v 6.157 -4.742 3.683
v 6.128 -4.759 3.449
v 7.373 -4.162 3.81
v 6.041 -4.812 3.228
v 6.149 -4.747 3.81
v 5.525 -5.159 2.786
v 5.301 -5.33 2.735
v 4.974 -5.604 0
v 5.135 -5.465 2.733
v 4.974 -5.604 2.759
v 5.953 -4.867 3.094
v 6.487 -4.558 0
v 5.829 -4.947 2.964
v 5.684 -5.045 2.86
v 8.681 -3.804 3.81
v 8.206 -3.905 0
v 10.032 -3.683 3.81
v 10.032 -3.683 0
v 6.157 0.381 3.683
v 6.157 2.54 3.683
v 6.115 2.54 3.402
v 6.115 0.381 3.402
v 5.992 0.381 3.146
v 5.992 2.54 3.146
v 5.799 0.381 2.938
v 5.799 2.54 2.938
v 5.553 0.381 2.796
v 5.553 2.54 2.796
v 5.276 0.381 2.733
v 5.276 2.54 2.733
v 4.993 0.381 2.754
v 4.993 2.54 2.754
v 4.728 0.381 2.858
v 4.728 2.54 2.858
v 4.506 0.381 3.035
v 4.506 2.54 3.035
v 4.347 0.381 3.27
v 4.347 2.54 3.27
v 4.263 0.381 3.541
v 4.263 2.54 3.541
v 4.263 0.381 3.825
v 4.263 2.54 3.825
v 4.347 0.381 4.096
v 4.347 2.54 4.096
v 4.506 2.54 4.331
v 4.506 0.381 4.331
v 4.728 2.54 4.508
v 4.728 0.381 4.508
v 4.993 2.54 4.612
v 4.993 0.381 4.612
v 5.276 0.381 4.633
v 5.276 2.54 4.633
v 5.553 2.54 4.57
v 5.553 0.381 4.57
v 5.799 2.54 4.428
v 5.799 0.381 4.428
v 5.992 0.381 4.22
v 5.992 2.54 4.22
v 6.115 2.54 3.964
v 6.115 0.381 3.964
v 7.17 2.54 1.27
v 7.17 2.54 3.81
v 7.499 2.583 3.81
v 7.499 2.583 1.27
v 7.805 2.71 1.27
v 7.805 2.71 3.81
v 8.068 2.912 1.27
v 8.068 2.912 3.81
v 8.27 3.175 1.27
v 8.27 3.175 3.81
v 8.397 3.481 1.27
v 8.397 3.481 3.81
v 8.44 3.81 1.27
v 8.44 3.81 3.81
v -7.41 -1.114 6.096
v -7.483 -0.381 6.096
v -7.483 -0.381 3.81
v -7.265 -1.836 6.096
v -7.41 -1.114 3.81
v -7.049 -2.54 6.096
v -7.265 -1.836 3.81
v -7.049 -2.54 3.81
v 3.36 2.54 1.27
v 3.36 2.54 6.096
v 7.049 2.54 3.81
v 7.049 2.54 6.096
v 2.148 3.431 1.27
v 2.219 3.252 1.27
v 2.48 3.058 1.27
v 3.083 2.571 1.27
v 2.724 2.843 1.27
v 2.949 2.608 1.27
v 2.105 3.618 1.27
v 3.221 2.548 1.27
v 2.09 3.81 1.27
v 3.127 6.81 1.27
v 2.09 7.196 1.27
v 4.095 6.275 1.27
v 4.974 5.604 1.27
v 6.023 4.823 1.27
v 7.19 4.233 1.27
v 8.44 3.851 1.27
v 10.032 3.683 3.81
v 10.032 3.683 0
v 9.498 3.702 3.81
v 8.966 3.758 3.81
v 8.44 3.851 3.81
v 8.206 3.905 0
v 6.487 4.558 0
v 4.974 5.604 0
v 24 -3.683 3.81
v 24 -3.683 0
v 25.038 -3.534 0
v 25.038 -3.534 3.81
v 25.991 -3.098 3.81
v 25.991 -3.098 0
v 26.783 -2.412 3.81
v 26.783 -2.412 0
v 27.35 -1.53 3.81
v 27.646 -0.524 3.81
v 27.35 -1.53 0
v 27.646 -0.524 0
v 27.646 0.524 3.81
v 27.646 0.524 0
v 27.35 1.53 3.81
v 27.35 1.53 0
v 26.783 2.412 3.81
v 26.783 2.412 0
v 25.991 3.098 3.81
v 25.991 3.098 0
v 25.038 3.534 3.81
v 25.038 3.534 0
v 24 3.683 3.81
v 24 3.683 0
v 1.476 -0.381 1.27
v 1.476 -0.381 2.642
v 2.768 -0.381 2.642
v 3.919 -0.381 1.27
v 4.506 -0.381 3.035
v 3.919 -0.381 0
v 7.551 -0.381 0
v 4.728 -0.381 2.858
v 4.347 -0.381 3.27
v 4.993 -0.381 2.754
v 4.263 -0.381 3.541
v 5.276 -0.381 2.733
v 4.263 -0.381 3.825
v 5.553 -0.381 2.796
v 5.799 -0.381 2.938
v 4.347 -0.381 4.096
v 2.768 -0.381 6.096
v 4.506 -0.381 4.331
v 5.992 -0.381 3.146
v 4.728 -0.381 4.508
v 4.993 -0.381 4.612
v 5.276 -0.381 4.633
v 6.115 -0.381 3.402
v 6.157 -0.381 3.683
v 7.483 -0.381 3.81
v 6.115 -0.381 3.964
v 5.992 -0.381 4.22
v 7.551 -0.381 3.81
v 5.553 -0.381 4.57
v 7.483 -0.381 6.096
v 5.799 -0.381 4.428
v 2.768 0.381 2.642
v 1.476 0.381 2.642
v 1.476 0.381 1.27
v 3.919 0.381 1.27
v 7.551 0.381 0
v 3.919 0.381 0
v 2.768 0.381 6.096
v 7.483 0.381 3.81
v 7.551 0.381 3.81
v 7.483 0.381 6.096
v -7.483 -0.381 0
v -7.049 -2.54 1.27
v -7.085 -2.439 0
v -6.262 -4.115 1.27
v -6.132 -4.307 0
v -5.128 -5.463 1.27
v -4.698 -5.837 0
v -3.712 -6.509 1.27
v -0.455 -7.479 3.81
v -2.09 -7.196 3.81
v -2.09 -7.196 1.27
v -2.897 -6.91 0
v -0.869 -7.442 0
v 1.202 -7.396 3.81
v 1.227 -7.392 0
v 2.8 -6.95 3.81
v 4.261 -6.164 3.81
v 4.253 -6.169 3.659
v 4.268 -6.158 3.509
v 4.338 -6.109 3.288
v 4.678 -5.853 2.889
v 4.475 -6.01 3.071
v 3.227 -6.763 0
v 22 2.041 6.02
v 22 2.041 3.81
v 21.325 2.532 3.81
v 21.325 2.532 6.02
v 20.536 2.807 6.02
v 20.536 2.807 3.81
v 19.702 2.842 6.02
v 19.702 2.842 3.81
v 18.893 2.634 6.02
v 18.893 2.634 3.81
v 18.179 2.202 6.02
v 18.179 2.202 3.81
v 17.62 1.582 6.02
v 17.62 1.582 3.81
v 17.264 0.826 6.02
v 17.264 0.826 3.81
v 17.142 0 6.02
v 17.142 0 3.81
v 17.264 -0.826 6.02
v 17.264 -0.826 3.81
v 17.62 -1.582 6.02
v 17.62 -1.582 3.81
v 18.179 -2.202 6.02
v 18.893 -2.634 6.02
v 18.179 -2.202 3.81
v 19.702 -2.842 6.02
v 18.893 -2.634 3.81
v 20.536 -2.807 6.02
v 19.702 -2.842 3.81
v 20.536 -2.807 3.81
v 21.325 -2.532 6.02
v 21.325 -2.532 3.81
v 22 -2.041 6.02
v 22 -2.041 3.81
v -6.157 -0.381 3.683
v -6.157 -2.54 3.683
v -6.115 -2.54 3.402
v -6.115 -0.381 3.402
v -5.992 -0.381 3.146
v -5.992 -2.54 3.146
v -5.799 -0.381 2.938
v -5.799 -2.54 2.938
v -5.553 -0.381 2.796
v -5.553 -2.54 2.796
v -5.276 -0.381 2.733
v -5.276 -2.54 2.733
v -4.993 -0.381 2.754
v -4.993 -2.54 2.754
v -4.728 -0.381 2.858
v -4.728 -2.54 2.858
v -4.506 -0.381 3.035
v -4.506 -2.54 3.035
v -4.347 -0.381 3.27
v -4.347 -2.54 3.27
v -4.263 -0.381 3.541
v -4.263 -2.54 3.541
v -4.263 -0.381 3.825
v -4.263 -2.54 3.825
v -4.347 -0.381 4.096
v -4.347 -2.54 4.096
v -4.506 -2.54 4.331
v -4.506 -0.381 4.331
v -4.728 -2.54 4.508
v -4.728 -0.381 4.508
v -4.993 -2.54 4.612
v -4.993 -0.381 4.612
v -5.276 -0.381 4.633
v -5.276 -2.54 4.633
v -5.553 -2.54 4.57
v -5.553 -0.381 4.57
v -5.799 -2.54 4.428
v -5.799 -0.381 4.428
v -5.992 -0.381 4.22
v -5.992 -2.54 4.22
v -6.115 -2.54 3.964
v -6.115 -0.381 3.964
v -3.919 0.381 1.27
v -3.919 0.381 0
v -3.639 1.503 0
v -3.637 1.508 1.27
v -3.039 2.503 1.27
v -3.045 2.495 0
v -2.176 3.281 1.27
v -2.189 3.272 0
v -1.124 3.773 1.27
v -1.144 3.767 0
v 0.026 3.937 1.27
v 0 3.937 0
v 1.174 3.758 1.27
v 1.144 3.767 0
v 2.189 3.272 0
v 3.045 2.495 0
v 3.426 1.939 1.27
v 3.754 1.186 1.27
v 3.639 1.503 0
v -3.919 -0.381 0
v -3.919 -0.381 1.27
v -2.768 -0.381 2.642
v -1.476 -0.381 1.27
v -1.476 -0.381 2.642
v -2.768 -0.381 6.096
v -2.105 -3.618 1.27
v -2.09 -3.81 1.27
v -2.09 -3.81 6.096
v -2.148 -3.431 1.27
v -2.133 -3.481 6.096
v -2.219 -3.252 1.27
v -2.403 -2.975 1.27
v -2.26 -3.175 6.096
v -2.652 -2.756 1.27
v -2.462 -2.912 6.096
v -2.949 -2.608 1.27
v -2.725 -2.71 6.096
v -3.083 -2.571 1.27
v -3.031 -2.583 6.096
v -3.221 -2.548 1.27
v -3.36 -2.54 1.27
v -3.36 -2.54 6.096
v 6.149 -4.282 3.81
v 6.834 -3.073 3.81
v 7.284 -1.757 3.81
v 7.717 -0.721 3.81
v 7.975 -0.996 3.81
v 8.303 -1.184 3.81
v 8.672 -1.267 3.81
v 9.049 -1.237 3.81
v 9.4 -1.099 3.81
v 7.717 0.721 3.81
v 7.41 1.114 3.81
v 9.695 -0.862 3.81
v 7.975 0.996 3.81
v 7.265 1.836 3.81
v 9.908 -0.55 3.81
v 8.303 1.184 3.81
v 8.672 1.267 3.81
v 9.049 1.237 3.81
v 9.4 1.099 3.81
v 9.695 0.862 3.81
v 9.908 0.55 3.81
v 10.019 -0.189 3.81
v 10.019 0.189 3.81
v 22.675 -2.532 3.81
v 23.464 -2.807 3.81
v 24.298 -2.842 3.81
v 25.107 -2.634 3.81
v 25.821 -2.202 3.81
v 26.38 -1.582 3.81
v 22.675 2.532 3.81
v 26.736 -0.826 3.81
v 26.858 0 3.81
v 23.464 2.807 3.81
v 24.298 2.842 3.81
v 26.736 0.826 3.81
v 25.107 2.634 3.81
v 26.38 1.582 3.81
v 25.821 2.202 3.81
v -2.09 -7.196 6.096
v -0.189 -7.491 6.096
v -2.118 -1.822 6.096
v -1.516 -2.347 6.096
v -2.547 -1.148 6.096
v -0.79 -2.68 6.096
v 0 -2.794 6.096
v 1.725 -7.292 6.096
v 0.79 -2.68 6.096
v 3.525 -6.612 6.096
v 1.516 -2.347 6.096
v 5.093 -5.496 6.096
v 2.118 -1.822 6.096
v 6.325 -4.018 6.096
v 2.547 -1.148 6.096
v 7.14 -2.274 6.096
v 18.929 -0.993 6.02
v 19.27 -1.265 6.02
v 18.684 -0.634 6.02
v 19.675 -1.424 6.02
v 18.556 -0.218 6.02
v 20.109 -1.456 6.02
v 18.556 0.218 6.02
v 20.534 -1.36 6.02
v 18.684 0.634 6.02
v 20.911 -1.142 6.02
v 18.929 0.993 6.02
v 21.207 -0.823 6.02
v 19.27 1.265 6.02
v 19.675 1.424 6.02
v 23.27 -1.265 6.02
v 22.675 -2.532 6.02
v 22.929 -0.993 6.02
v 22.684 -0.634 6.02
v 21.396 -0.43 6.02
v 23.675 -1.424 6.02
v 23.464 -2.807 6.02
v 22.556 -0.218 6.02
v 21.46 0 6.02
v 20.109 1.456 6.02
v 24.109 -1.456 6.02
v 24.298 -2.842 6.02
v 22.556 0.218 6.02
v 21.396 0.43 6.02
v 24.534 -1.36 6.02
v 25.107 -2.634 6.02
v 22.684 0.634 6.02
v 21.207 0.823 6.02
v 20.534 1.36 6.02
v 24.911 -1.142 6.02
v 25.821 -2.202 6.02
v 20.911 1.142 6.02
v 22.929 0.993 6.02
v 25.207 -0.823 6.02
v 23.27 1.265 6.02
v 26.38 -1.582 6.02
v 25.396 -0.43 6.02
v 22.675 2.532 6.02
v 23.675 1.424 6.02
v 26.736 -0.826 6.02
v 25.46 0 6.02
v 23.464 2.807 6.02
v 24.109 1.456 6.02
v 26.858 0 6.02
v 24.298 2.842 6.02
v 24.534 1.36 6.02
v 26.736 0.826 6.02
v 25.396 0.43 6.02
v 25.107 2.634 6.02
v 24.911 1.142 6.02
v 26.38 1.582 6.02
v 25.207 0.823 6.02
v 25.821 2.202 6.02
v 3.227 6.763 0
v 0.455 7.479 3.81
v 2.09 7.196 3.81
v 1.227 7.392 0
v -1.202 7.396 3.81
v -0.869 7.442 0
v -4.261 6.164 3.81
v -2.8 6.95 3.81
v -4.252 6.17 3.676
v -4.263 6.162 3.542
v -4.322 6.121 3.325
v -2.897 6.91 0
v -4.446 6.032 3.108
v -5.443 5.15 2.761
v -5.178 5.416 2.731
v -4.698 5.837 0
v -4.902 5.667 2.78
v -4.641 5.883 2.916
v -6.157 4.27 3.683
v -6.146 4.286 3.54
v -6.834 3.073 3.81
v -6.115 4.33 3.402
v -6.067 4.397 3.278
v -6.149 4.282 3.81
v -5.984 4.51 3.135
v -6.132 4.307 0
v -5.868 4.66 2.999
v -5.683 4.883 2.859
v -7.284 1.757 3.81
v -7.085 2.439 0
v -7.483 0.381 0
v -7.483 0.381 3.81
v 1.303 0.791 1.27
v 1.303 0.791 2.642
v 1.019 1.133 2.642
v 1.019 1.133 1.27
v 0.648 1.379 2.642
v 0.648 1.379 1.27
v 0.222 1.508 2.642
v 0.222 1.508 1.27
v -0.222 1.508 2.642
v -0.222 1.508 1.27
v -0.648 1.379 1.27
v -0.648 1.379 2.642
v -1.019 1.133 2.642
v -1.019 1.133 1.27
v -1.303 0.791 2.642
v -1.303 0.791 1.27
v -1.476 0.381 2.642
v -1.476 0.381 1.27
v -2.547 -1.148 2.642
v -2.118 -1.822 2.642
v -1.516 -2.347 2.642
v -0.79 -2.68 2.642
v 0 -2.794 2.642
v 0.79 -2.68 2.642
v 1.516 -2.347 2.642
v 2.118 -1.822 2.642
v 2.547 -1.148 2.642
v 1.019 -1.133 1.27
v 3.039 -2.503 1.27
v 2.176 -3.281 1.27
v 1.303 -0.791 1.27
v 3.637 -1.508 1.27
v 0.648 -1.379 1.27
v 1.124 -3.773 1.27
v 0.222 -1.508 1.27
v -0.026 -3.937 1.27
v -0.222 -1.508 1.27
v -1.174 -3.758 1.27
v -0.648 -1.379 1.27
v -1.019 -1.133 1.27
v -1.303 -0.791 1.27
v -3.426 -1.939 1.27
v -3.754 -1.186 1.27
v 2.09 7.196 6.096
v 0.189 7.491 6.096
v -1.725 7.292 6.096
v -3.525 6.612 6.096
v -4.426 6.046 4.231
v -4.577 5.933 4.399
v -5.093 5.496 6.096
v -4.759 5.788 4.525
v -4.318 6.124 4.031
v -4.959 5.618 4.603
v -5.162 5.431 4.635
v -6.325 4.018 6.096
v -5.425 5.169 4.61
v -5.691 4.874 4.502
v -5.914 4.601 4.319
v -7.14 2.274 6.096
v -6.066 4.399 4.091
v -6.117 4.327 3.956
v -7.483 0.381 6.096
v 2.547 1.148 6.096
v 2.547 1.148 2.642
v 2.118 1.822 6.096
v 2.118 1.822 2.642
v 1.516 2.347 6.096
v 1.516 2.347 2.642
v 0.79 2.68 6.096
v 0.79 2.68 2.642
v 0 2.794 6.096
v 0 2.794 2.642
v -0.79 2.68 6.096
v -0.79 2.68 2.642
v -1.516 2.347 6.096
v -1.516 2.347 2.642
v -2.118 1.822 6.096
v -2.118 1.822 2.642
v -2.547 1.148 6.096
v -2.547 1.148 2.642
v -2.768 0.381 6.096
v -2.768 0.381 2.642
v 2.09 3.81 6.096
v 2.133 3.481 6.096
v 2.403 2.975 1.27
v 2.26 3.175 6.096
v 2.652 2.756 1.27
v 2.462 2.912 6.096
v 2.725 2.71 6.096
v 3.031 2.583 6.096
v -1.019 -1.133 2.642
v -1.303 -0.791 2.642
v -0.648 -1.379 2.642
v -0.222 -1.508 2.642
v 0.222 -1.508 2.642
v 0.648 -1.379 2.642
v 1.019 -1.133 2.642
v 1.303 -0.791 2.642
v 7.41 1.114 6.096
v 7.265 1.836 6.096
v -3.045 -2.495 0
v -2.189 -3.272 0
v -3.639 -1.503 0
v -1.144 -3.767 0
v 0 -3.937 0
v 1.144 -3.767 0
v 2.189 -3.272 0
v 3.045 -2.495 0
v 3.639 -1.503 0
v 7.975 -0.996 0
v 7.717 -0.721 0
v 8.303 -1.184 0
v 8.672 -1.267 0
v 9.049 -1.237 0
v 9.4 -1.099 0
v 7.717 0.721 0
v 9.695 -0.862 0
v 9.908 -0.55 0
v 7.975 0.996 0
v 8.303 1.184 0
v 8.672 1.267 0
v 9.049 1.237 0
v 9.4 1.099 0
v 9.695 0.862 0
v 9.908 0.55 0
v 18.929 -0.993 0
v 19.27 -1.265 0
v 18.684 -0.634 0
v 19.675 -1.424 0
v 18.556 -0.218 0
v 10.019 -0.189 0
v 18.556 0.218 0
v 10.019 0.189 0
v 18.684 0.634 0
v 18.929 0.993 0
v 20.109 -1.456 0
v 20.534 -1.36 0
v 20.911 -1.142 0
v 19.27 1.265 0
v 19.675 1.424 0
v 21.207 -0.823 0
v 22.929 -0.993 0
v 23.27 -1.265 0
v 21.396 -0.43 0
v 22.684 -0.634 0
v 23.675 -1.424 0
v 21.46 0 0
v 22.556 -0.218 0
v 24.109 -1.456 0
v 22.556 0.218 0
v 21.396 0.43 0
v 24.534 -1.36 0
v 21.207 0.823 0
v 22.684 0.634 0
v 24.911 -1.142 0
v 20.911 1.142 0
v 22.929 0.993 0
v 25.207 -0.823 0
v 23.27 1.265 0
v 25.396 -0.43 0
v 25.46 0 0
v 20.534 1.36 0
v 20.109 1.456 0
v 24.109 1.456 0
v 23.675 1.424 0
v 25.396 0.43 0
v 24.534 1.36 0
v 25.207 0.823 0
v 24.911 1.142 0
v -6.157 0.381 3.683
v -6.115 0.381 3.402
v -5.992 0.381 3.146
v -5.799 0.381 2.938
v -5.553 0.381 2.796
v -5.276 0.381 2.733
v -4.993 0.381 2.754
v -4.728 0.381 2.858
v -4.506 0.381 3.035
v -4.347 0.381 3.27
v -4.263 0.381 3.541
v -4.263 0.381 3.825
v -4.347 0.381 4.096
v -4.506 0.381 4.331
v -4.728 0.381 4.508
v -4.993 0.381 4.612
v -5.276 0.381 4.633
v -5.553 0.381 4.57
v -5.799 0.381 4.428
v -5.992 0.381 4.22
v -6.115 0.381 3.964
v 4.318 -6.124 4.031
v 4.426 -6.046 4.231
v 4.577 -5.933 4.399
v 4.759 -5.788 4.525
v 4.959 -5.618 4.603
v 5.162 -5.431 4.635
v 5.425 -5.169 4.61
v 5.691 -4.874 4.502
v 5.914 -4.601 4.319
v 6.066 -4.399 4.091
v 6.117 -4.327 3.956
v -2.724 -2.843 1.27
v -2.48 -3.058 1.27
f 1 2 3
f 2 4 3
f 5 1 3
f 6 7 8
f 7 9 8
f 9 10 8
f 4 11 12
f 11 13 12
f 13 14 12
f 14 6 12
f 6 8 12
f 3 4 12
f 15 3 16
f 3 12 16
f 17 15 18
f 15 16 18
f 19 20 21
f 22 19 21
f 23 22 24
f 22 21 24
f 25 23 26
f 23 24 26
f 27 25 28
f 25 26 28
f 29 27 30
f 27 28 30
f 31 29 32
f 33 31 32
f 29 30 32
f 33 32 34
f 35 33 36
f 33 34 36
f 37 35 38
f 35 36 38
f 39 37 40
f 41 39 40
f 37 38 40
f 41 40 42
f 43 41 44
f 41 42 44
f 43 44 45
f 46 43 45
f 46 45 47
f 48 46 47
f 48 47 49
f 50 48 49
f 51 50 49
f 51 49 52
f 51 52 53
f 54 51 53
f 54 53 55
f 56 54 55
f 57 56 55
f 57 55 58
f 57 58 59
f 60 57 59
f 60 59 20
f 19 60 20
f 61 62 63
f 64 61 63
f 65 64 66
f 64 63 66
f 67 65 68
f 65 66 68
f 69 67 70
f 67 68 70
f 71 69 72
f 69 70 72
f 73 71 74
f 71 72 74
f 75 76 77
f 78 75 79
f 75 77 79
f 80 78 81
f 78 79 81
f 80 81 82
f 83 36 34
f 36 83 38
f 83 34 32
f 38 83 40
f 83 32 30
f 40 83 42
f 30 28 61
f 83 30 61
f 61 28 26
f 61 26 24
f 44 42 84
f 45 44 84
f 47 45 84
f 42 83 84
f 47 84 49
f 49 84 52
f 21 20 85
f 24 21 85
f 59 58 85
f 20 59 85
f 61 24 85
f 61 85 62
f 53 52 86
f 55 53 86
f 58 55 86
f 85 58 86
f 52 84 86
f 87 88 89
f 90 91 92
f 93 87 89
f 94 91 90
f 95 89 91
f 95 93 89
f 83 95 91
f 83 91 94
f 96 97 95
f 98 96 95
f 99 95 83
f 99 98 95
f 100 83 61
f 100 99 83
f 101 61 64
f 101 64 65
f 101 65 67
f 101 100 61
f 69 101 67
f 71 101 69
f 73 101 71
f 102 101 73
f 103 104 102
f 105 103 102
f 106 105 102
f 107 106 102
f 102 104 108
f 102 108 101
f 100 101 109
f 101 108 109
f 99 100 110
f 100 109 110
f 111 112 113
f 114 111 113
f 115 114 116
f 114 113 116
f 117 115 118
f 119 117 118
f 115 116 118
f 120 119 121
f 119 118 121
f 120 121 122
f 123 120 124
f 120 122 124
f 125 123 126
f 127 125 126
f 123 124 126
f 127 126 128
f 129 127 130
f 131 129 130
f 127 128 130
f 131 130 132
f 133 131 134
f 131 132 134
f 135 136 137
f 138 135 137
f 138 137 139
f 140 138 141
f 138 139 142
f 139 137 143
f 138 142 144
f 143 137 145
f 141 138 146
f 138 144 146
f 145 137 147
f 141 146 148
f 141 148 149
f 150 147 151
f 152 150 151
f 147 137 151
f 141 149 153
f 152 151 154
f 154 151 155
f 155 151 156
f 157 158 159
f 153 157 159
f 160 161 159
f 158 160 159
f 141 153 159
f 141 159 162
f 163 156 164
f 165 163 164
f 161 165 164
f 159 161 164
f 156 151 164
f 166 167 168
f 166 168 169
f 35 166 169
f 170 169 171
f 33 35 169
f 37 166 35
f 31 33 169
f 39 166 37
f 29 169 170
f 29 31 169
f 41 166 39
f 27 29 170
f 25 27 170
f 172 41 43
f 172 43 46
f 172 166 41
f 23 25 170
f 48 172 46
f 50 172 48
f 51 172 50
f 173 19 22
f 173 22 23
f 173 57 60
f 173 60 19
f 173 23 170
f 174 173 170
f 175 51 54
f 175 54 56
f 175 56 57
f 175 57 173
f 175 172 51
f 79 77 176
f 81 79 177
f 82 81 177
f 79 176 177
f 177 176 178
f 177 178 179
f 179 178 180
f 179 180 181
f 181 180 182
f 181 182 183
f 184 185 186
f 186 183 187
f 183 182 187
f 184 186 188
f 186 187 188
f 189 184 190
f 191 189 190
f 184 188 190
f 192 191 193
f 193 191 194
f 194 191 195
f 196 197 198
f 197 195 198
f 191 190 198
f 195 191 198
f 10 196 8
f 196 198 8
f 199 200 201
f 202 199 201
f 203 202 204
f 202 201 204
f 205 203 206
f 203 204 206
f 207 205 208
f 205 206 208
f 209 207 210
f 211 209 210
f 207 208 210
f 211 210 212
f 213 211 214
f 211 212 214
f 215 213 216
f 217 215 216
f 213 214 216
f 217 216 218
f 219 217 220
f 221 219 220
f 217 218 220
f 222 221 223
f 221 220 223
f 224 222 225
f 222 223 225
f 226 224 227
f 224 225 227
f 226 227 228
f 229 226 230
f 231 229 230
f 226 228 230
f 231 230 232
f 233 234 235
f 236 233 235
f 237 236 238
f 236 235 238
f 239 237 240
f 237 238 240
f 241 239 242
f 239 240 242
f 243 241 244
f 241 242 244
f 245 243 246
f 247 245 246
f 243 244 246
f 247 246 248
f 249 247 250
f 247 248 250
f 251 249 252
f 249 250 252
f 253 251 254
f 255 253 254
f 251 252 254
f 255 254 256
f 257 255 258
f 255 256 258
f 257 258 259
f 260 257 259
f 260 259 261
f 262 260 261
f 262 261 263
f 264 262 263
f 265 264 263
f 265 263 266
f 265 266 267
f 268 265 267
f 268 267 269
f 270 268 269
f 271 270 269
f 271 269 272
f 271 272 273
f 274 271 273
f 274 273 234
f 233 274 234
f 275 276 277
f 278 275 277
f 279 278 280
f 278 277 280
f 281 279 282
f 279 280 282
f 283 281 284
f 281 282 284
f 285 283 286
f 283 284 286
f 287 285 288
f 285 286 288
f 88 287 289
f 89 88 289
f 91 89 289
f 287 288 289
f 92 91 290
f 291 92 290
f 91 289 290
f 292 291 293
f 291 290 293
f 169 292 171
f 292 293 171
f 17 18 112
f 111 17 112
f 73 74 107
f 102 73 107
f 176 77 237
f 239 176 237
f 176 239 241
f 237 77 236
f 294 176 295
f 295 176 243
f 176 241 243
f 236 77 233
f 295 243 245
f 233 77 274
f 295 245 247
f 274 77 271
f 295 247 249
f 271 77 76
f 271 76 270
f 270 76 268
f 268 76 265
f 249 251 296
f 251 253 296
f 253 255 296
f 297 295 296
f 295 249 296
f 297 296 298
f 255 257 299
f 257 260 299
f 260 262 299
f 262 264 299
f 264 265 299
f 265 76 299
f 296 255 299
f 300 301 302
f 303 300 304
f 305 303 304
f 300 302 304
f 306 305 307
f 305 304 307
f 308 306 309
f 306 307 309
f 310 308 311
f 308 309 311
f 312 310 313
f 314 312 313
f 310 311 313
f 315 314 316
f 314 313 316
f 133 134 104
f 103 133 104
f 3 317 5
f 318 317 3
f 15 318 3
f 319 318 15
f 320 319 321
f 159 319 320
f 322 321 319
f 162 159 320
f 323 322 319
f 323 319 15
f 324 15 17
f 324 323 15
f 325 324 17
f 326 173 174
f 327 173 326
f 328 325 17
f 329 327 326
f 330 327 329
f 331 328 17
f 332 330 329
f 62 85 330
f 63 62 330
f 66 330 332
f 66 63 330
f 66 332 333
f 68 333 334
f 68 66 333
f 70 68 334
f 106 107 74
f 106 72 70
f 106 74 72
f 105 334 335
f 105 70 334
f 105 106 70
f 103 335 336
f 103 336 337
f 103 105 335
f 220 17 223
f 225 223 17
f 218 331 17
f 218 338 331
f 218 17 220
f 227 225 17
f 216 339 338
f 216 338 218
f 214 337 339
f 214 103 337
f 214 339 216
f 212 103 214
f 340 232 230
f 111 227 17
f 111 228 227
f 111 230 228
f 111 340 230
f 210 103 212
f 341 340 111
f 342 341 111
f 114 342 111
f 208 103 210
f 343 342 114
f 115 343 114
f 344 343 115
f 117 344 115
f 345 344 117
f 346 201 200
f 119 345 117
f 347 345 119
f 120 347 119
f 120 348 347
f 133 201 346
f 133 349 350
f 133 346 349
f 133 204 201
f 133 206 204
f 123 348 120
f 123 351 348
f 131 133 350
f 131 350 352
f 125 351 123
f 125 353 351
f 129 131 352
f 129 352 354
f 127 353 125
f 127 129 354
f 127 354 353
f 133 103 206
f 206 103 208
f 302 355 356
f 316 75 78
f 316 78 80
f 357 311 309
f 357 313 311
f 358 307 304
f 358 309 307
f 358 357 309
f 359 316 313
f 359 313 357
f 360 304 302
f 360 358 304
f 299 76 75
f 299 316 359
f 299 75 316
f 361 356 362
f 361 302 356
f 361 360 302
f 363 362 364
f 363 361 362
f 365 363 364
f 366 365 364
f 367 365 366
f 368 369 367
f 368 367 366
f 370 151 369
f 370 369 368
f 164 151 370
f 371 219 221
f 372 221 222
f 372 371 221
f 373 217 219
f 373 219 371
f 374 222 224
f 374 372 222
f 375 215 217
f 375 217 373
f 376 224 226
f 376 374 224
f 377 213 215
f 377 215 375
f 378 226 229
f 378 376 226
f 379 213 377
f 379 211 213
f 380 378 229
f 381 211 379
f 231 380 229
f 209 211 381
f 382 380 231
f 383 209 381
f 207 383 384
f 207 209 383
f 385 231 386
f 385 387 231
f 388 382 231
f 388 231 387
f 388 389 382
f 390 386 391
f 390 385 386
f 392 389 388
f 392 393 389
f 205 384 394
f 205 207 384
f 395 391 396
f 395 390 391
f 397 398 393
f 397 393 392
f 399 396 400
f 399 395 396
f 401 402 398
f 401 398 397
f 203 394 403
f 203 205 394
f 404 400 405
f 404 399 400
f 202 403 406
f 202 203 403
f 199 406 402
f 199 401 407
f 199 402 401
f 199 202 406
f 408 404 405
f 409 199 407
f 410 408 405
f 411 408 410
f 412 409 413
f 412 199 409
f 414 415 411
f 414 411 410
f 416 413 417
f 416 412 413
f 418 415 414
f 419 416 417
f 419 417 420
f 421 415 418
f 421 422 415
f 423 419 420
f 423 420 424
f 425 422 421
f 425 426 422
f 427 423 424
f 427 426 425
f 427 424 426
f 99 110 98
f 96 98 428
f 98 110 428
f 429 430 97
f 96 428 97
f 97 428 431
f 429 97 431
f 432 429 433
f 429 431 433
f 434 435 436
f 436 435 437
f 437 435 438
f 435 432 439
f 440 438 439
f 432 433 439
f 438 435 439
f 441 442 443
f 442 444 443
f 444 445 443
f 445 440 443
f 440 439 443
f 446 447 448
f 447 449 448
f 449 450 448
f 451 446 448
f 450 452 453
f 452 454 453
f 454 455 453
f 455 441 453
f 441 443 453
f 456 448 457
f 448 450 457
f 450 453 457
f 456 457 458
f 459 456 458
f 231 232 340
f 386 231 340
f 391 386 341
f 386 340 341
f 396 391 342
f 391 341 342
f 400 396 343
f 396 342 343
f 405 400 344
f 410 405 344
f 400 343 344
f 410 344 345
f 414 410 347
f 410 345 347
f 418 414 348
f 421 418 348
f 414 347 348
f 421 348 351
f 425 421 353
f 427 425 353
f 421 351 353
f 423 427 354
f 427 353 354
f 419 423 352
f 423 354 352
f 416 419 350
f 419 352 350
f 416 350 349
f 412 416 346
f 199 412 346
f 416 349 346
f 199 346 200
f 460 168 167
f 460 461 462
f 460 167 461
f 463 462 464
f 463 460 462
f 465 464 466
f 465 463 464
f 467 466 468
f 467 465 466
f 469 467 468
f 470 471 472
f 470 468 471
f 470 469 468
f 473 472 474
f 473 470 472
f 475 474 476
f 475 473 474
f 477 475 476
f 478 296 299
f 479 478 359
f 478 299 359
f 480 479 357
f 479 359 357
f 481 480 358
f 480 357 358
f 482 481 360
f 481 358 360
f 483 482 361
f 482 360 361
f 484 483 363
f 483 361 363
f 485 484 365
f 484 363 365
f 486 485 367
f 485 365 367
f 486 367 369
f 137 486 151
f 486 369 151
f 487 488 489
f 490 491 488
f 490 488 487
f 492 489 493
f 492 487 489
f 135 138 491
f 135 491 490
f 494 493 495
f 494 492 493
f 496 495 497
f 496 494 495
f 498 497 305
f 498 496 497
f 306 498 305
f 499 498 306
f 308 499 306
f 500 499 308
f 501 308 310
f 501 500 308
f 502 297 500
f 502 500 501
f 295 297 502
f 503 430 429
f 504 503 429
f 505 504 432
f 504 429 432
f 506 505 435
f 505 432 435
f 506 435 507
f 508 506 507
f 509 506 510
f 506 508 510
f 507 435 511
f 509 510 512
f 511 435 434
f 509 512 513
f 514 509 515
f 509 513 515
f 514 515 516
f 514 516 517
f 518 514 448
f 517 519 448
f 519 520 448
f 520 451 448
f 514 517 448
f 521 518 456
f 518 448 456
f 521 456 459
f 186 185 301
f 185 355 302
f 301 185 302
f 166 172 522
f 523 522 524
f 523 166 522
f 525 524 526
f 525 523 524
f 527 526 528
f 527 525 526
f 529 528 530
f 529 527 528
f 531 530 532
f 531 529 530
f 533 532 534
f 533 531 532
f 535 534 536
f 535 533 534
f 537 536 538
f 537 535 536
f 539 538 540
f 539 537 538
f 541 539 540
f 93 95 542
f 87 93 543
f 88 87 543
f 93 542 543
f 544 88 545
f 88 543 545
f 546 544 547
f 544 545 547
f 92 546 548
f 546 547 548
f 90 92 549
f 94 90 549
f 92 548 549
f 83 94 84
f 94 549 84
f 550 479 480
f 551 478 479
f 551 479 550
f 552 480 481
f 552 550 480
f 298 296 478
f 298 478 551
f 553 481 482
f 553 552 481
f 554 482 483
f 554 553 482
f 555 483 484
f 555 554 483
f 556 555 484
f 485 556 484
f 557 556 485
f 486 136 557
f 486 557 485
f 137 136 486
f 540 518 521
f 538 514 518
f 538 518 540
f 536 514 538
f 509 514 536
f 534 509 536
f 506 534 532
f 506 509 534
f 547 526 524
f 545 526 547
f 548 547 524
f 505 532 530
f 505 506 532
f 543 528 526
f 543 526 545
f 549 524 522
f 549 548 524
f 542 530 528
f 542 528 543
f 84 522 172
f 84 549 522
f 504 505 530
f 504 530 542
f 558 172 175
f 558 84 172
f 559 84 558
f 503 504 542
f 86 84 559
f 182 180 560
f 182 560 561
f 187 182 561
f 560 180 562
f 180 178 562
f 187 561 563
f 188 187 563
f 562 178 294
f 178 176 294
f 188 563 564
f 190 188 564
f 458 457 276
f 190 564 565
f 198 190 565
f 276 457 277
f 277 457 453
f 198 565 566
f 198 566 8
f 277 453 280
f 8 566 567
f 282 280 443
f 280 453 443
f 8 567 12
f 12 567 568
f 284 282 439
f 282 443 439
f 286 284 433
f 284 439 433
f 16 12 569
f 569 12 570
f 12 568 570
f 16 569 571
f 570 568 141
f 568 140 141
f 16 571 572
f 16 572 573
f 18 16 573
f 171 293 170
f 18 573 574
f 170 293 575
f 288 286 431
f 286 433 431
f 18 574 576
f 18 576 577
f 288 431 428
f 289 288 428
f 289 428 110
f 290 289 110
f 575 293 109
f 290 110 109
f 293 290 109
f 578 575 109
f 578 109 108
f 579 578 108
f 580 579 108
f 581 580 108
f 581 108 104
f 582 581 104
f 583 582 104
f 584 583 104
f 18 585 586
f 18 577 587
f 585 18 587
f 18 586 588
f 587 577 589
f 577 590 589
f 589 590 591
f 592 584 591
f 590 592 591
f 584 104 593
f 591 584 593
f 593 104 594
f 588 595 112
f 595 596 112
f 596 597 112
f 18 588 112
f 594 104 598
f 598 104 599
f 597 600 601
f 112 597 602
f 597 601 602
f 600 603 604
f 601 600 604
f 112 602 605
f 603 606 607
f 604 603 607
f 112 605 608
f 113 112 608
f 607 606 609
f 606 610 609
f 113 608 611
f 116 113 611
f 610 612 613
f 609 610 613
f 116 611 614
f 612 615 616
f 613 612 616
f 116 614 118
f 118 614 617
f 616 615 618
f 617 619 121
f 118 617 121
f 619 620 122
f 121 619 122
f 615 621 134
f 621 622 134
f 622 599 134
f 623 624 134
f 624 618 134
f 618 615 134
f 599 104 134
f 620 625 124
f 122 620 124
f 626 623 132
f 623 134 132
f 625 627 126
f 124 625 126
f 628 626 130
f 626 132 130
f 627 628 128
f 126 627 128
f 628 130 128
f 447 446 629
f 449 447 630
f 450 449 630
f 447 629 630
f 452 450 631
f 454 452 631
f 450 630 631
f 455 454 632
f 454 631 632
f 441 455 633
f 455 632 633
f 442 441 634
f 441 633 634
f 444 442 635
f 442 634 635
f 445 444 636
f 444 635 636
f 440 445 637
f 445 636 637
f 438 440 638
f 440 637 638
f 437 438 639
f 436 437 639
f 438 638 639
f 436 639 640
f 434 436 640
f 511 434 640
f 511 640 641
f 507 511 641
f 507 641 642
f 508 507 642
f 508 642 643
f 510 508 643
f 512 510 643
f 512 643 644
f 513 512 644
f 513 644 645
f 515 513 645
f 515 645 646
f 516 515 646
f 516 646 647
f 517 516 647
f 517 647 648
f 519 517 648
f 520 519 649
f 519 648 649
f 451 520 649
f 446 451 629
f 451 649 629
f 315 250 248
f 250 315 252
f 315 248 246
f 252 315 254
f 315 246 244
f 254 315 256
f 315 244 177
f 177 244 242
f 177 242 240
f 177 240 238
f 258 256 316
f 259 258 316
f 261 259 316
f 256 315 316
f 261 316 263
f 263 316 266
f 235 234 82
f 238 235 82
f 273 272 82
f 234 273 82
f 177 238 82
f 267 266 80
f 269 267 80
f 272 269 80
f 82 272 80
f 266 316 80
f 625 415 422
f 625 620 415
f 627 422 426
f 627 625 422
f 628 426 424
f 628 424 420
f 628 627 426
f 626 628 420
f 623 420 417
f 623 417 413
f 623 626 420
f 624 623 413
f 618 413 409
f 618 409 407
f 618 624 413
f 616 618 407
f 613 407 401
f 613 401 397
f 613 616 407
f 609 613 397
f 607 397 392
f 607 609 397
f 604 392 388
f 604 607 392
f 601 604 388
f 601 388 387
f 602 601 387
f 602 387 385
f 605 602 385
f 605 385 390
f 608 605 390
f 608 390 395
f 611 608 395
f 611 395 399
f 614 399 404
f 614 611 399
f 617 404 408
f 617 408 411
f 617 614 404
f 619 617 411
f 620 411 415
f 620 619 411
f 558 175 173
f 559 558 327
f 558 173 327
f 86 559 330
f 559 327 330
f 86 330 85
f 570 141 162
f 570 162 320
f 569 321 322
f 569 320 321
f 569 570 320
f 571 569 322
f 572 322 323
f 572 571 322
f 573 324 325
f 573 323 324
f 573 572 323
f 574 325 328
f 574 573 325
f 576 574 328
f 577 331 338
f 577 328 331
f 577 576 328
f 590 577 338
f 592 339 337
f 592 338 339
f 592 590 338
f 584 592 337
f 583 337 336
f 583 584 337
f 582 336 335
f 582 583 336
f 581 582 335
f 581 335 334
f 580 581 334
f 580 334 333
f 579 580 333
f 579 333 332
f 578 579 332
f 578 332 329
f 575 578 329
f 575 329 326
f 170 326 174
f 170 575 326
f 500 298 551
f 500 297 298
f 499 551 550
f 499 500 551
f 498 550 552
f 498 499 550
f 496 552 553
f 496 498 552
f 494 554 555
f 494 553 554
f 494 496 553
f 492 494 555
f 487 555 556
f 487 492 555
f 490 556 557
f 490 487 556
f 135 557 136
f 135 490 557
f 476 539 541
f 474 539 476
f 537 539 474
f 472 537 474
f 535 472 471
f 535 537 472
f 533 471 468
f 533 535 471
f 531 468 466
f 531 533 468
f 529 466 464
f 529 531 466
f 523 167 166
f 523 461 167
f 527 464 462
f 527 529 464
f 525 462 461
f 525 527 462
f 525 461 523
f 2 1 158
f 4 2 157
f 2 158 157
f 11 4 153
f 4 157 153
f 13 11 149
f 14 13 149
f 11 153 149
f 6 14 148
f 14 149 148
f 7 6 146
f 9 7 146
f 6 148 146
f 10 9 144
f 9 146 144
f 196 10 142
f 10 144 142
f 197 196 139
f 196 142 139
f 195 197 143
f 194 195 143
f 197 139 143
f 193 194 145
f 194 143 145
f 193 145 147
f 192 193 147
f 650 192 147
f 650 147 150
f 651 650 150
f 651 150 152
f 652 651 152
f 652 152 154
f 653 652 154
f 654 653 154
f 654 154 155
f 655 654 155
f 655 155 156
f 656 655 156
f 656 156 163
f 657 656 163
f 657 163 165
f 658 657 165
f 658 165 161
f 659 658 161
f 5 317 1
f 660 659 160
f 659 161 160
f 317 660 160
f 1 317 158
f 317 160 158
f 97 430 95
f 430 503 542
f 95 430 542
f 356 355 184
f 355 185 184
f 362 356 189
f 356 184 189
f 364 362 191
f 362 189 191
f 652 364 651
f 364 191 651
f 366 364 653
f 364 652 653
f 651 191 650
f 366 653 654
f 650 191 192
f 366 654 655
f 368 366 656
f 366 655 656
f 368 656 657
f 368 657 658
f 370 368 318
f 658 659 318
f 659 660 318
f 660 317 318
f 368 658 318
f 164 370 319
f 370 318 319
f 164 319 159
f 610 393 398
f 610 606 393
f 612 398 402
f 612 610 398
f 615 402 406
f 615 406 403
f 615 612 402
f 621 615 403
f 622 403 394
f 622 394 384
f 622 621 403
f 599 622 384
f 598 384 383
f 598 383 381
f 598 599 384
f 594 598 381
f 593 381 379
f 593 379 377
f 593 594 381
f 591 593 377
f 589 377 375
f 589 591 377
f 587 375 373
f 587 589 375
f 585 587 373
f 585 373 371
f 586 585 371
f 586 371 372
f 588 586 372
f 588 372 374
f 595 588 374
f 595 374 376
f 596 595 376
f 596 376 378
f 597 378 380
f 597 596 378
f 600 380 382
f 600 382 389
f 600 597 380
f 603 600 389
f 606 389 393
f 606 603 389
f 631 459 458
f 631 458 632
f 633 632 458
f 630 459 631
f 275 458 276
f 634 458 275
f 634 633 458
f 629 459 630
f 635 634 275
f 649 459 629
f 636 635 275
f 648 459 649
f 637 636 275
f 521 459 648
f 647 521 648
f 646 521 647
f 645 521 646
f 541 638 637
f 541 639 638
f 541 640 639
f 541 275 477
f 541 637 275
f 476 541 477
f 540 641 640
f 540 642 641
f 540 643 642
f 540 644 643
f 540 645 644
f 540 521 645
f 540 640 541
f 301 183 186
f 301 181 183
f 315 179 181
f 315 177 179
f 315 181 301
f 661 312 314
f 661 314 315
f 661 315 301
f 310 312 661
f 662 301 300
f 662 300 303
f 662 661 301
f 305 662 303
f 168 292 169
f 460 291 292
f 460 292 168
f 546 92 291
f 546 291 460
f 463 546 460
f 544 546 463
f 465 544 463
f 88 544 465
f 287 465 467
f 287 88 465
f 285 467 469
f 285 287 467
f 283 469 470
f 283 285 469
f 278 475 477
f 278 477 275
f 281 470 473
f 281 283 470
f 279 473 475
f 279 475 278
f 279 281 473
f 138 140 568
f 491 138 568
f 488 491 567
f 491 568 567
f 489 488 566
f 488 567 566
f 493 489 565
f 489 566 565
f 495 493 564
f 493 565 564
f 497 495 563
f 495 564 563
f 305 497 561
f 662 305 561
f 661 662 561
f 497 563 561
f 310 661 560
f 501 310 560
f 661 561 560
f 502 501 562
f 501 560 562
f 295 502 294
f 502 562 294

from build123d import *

# Parameters (mm, degrees)
SKETCH1_R           = 1.4605
SKETCH1_R_2         = 1.524
SKETCH1_R_3         = 1.27
BOSS_EXTRUDE2_DEPTH = 3.81
SKETCH2_R           = 1.4605
BOSS_EXTRUDE3_DEPTH = 2.2098
SKETCH3_R           = 7.493
SKETCH3_R_2         = 2.794
BOSS_EXTRUDE4_DEPTH = 2.286
SKETCH4_R           = 2.794
CUT_EXTRUDE1_DEPTH  = 3.4544
CUT_EXTRUDE2_DEPTH  = 4.826
SKETCH6_R           = 0.9525
CUT_EXTRUDE3_DEPTH  = 11.033
SKETCH7_R           = 0.9525
CUT_EXTRUDE4_DEPTH  = 11.0330001
SKETCH8_W           = 15.900663219
SKETCH8_H           = 0.762
CUT_EXTRUDE5_DEPTH  = 7.0960001
SKETCH9_R           = 3.937
CUT_EXTRUDE6_DEPTH  = 1.27


with BuildPart() as part:
    # Sketch1 → Boss-Extrude2 (new body)
    with BuildSketch(Plane.XY):
        with BuildLine():
            Line((24, 3.683), (10.03219617, 3.683))
            ThreePointArc((10.03219617, 3.683), (7.326823365, 4.179422389), (4.973946, 5.604008403))
            ThreePointArc((4.973946, 5.604008403), (-7.493, 0), (4.973946, -5.604008403))
            ThreePointArc((4.973946, -5.604008403), (7.326823365, -4.179422389), (10.03219617, -3.683))
            Line((10.03219617, -3.683), (24, -3.683))
            ThreePointArc((24, -3.683), (27.683, 0), (24, 3.683))
        make_face()
        with Locations((24, 0)):
            Circle(SKETCH1_R, mode=Mode.SUBTRACT)
        with Locations((20, 0)):
            Circle(SKETCH1_R, mode=Mode.SUBTRACT)
        Circle(SKETCH1_R_2, mode=Mode.SUBTRACT)
        with Locations((8.763, 0)):
            Circle(SKETCH1_R_3, mode=Mode.SUBTRACT)
    extrude(amount=BOSS_EXTRUDE2_DEPTH)

    # Sketch2 → Boss-Extrude3 (add)
    with BuildSketch(Plane.XY.offset(3.81)):
        with BuildLine():
            ThreePointArc((22, -2.040908192), (26.8575, 0), (22, 2.040908192))
            ThreePointArc((22, 2.040908192), (17.1425, 0), (22, -2.040908192))
        make_face()
        with Locations((20, 0)):
            Circle(SKETCH2_R, mode=Mode.SUBTRACT)
        with Locations((24, 0)):
            Circle(SKETCH2_R, mode=Mode.SUBTRACT)
    extrude(amount=BOSS_EXTRUDE3_DEPTH)

    # Sketch3 → Boss-Extrude4 (add)
    with BuildSketch(Plane.XY.offset(3.81)):
        Circle(SKETCH3_R)
        Circle(SKETCH3_R_2, mode=Mode.SUBTRACT)
    extrude(amount=BOSS_EXTRUDE4_DEPTH)

    # Sketch4 → Cut-Extrude1 (cut)
    with BuildSketch(Plane.XY.offset(6.096)):
        Circle(SKETCH4_R)
    extrude(amount=-CUT_EXTRUDE1_DEPTH, mode=Mode.SUBTRACT)

    # Sketch5 → Cut-Extrude2 (cut)
    with BuildSketch(Plane.XY.offset(6.096)):
        with BuildLine():
            Line((-2.090104165, -8.640089248), (-2.090104165, -3.81))
            ThreePointArc((-2.090104165, -3.81), (-2.462078553, -2.911974388), (-3.360104165, -2.54))
            Line((-3.360104165, -2.54), (-7.170104165, -2.54))
            ThreePointArc((-7.170104165, -2.54), (-8.068129777, -2.911974388), (-8.440104165, -3.81))
            Line((-8.440104165, -3.81), (-8.440104165, -8.640089248))
            Line((-8.440104165, -8.640089248), (-2.090104165, -8.640089248))
        make_face()
        with BuildLine():
            Line((8.440104165, 8.640089248), (2.090104165, 8.640089248))
            Line((2.090104165, 8.640089248), (2.090104165, 3.81))
            ThreePointArc((2.090104165, 3.81), (2.462078553, 2.911974388), (3.360104165, 2.54))
            Line((3.360104165, 2.54), (7.170104165, 2.54))
            ThreePointArc((7.170104165, 2.54), (8.068129777, 2.911974388), (8.440104165, 3.81))
            Line((8.440104165, 3.81), (8.440104165, 8.640089248))
        make_face()
    extrude(amount=-CUT_EXTRUDE2_DEPTH, mode=Mode.SUBTRACT)

    # Sketch6 → Cut-Extrude3 (cut, through all)
    with BuildSketch(Plane(origin=(0, -2.54, 0), x_dir=(-1, 0, 0), z_dir=(0, -1, 0))):
        with Locations((5.20473111, -3.683)):
            Circle(SKETCH6_R)
    extrude(amount=-CUT_EXTRUDE3_DEPTH, mode=Mode.SUBTRACT)

    # Sketch7 → Cut-Extrude4 (cut, through all)
    with BuildSketch(Plane(origin=(0, 2.54, 0), x_dir=(1, 0, 0), z_dir=(0, 1, 0))):
        with Locations((5.20473111, -3.683)):
            Circle(SKETCH7_R)
    extrude(amount=-CUT_EXTRUDE4_DEPTH, mode=Mode.SUBTRACT)

    # Sketch8 → Cut-Extrude5 (cut, through all)
    with BuildSketch(Plane.XY.offset(6.096)):
        with Locations((0.457331609, 0)):
            Rectangle(SKETCH8_W, SKETCH8_H)
    extrude(amount=-CUT_EXTRUDE5_DEPTH, mode=Mode.SUBTRACT)

    # Sketch9 → Cut-Extrude6 (cut)
    with BuildSketch(Plane(origin=(0, 0, 0), x_dir=(-1, 0, 0), z_dir=(0, 0, -1))):
        Circle(SKETCH9_R)
    extrude(amount=-CUT_EXTRUDE6_DEPTH, mode=Mode.SUBTRACT)


solid = part.part
